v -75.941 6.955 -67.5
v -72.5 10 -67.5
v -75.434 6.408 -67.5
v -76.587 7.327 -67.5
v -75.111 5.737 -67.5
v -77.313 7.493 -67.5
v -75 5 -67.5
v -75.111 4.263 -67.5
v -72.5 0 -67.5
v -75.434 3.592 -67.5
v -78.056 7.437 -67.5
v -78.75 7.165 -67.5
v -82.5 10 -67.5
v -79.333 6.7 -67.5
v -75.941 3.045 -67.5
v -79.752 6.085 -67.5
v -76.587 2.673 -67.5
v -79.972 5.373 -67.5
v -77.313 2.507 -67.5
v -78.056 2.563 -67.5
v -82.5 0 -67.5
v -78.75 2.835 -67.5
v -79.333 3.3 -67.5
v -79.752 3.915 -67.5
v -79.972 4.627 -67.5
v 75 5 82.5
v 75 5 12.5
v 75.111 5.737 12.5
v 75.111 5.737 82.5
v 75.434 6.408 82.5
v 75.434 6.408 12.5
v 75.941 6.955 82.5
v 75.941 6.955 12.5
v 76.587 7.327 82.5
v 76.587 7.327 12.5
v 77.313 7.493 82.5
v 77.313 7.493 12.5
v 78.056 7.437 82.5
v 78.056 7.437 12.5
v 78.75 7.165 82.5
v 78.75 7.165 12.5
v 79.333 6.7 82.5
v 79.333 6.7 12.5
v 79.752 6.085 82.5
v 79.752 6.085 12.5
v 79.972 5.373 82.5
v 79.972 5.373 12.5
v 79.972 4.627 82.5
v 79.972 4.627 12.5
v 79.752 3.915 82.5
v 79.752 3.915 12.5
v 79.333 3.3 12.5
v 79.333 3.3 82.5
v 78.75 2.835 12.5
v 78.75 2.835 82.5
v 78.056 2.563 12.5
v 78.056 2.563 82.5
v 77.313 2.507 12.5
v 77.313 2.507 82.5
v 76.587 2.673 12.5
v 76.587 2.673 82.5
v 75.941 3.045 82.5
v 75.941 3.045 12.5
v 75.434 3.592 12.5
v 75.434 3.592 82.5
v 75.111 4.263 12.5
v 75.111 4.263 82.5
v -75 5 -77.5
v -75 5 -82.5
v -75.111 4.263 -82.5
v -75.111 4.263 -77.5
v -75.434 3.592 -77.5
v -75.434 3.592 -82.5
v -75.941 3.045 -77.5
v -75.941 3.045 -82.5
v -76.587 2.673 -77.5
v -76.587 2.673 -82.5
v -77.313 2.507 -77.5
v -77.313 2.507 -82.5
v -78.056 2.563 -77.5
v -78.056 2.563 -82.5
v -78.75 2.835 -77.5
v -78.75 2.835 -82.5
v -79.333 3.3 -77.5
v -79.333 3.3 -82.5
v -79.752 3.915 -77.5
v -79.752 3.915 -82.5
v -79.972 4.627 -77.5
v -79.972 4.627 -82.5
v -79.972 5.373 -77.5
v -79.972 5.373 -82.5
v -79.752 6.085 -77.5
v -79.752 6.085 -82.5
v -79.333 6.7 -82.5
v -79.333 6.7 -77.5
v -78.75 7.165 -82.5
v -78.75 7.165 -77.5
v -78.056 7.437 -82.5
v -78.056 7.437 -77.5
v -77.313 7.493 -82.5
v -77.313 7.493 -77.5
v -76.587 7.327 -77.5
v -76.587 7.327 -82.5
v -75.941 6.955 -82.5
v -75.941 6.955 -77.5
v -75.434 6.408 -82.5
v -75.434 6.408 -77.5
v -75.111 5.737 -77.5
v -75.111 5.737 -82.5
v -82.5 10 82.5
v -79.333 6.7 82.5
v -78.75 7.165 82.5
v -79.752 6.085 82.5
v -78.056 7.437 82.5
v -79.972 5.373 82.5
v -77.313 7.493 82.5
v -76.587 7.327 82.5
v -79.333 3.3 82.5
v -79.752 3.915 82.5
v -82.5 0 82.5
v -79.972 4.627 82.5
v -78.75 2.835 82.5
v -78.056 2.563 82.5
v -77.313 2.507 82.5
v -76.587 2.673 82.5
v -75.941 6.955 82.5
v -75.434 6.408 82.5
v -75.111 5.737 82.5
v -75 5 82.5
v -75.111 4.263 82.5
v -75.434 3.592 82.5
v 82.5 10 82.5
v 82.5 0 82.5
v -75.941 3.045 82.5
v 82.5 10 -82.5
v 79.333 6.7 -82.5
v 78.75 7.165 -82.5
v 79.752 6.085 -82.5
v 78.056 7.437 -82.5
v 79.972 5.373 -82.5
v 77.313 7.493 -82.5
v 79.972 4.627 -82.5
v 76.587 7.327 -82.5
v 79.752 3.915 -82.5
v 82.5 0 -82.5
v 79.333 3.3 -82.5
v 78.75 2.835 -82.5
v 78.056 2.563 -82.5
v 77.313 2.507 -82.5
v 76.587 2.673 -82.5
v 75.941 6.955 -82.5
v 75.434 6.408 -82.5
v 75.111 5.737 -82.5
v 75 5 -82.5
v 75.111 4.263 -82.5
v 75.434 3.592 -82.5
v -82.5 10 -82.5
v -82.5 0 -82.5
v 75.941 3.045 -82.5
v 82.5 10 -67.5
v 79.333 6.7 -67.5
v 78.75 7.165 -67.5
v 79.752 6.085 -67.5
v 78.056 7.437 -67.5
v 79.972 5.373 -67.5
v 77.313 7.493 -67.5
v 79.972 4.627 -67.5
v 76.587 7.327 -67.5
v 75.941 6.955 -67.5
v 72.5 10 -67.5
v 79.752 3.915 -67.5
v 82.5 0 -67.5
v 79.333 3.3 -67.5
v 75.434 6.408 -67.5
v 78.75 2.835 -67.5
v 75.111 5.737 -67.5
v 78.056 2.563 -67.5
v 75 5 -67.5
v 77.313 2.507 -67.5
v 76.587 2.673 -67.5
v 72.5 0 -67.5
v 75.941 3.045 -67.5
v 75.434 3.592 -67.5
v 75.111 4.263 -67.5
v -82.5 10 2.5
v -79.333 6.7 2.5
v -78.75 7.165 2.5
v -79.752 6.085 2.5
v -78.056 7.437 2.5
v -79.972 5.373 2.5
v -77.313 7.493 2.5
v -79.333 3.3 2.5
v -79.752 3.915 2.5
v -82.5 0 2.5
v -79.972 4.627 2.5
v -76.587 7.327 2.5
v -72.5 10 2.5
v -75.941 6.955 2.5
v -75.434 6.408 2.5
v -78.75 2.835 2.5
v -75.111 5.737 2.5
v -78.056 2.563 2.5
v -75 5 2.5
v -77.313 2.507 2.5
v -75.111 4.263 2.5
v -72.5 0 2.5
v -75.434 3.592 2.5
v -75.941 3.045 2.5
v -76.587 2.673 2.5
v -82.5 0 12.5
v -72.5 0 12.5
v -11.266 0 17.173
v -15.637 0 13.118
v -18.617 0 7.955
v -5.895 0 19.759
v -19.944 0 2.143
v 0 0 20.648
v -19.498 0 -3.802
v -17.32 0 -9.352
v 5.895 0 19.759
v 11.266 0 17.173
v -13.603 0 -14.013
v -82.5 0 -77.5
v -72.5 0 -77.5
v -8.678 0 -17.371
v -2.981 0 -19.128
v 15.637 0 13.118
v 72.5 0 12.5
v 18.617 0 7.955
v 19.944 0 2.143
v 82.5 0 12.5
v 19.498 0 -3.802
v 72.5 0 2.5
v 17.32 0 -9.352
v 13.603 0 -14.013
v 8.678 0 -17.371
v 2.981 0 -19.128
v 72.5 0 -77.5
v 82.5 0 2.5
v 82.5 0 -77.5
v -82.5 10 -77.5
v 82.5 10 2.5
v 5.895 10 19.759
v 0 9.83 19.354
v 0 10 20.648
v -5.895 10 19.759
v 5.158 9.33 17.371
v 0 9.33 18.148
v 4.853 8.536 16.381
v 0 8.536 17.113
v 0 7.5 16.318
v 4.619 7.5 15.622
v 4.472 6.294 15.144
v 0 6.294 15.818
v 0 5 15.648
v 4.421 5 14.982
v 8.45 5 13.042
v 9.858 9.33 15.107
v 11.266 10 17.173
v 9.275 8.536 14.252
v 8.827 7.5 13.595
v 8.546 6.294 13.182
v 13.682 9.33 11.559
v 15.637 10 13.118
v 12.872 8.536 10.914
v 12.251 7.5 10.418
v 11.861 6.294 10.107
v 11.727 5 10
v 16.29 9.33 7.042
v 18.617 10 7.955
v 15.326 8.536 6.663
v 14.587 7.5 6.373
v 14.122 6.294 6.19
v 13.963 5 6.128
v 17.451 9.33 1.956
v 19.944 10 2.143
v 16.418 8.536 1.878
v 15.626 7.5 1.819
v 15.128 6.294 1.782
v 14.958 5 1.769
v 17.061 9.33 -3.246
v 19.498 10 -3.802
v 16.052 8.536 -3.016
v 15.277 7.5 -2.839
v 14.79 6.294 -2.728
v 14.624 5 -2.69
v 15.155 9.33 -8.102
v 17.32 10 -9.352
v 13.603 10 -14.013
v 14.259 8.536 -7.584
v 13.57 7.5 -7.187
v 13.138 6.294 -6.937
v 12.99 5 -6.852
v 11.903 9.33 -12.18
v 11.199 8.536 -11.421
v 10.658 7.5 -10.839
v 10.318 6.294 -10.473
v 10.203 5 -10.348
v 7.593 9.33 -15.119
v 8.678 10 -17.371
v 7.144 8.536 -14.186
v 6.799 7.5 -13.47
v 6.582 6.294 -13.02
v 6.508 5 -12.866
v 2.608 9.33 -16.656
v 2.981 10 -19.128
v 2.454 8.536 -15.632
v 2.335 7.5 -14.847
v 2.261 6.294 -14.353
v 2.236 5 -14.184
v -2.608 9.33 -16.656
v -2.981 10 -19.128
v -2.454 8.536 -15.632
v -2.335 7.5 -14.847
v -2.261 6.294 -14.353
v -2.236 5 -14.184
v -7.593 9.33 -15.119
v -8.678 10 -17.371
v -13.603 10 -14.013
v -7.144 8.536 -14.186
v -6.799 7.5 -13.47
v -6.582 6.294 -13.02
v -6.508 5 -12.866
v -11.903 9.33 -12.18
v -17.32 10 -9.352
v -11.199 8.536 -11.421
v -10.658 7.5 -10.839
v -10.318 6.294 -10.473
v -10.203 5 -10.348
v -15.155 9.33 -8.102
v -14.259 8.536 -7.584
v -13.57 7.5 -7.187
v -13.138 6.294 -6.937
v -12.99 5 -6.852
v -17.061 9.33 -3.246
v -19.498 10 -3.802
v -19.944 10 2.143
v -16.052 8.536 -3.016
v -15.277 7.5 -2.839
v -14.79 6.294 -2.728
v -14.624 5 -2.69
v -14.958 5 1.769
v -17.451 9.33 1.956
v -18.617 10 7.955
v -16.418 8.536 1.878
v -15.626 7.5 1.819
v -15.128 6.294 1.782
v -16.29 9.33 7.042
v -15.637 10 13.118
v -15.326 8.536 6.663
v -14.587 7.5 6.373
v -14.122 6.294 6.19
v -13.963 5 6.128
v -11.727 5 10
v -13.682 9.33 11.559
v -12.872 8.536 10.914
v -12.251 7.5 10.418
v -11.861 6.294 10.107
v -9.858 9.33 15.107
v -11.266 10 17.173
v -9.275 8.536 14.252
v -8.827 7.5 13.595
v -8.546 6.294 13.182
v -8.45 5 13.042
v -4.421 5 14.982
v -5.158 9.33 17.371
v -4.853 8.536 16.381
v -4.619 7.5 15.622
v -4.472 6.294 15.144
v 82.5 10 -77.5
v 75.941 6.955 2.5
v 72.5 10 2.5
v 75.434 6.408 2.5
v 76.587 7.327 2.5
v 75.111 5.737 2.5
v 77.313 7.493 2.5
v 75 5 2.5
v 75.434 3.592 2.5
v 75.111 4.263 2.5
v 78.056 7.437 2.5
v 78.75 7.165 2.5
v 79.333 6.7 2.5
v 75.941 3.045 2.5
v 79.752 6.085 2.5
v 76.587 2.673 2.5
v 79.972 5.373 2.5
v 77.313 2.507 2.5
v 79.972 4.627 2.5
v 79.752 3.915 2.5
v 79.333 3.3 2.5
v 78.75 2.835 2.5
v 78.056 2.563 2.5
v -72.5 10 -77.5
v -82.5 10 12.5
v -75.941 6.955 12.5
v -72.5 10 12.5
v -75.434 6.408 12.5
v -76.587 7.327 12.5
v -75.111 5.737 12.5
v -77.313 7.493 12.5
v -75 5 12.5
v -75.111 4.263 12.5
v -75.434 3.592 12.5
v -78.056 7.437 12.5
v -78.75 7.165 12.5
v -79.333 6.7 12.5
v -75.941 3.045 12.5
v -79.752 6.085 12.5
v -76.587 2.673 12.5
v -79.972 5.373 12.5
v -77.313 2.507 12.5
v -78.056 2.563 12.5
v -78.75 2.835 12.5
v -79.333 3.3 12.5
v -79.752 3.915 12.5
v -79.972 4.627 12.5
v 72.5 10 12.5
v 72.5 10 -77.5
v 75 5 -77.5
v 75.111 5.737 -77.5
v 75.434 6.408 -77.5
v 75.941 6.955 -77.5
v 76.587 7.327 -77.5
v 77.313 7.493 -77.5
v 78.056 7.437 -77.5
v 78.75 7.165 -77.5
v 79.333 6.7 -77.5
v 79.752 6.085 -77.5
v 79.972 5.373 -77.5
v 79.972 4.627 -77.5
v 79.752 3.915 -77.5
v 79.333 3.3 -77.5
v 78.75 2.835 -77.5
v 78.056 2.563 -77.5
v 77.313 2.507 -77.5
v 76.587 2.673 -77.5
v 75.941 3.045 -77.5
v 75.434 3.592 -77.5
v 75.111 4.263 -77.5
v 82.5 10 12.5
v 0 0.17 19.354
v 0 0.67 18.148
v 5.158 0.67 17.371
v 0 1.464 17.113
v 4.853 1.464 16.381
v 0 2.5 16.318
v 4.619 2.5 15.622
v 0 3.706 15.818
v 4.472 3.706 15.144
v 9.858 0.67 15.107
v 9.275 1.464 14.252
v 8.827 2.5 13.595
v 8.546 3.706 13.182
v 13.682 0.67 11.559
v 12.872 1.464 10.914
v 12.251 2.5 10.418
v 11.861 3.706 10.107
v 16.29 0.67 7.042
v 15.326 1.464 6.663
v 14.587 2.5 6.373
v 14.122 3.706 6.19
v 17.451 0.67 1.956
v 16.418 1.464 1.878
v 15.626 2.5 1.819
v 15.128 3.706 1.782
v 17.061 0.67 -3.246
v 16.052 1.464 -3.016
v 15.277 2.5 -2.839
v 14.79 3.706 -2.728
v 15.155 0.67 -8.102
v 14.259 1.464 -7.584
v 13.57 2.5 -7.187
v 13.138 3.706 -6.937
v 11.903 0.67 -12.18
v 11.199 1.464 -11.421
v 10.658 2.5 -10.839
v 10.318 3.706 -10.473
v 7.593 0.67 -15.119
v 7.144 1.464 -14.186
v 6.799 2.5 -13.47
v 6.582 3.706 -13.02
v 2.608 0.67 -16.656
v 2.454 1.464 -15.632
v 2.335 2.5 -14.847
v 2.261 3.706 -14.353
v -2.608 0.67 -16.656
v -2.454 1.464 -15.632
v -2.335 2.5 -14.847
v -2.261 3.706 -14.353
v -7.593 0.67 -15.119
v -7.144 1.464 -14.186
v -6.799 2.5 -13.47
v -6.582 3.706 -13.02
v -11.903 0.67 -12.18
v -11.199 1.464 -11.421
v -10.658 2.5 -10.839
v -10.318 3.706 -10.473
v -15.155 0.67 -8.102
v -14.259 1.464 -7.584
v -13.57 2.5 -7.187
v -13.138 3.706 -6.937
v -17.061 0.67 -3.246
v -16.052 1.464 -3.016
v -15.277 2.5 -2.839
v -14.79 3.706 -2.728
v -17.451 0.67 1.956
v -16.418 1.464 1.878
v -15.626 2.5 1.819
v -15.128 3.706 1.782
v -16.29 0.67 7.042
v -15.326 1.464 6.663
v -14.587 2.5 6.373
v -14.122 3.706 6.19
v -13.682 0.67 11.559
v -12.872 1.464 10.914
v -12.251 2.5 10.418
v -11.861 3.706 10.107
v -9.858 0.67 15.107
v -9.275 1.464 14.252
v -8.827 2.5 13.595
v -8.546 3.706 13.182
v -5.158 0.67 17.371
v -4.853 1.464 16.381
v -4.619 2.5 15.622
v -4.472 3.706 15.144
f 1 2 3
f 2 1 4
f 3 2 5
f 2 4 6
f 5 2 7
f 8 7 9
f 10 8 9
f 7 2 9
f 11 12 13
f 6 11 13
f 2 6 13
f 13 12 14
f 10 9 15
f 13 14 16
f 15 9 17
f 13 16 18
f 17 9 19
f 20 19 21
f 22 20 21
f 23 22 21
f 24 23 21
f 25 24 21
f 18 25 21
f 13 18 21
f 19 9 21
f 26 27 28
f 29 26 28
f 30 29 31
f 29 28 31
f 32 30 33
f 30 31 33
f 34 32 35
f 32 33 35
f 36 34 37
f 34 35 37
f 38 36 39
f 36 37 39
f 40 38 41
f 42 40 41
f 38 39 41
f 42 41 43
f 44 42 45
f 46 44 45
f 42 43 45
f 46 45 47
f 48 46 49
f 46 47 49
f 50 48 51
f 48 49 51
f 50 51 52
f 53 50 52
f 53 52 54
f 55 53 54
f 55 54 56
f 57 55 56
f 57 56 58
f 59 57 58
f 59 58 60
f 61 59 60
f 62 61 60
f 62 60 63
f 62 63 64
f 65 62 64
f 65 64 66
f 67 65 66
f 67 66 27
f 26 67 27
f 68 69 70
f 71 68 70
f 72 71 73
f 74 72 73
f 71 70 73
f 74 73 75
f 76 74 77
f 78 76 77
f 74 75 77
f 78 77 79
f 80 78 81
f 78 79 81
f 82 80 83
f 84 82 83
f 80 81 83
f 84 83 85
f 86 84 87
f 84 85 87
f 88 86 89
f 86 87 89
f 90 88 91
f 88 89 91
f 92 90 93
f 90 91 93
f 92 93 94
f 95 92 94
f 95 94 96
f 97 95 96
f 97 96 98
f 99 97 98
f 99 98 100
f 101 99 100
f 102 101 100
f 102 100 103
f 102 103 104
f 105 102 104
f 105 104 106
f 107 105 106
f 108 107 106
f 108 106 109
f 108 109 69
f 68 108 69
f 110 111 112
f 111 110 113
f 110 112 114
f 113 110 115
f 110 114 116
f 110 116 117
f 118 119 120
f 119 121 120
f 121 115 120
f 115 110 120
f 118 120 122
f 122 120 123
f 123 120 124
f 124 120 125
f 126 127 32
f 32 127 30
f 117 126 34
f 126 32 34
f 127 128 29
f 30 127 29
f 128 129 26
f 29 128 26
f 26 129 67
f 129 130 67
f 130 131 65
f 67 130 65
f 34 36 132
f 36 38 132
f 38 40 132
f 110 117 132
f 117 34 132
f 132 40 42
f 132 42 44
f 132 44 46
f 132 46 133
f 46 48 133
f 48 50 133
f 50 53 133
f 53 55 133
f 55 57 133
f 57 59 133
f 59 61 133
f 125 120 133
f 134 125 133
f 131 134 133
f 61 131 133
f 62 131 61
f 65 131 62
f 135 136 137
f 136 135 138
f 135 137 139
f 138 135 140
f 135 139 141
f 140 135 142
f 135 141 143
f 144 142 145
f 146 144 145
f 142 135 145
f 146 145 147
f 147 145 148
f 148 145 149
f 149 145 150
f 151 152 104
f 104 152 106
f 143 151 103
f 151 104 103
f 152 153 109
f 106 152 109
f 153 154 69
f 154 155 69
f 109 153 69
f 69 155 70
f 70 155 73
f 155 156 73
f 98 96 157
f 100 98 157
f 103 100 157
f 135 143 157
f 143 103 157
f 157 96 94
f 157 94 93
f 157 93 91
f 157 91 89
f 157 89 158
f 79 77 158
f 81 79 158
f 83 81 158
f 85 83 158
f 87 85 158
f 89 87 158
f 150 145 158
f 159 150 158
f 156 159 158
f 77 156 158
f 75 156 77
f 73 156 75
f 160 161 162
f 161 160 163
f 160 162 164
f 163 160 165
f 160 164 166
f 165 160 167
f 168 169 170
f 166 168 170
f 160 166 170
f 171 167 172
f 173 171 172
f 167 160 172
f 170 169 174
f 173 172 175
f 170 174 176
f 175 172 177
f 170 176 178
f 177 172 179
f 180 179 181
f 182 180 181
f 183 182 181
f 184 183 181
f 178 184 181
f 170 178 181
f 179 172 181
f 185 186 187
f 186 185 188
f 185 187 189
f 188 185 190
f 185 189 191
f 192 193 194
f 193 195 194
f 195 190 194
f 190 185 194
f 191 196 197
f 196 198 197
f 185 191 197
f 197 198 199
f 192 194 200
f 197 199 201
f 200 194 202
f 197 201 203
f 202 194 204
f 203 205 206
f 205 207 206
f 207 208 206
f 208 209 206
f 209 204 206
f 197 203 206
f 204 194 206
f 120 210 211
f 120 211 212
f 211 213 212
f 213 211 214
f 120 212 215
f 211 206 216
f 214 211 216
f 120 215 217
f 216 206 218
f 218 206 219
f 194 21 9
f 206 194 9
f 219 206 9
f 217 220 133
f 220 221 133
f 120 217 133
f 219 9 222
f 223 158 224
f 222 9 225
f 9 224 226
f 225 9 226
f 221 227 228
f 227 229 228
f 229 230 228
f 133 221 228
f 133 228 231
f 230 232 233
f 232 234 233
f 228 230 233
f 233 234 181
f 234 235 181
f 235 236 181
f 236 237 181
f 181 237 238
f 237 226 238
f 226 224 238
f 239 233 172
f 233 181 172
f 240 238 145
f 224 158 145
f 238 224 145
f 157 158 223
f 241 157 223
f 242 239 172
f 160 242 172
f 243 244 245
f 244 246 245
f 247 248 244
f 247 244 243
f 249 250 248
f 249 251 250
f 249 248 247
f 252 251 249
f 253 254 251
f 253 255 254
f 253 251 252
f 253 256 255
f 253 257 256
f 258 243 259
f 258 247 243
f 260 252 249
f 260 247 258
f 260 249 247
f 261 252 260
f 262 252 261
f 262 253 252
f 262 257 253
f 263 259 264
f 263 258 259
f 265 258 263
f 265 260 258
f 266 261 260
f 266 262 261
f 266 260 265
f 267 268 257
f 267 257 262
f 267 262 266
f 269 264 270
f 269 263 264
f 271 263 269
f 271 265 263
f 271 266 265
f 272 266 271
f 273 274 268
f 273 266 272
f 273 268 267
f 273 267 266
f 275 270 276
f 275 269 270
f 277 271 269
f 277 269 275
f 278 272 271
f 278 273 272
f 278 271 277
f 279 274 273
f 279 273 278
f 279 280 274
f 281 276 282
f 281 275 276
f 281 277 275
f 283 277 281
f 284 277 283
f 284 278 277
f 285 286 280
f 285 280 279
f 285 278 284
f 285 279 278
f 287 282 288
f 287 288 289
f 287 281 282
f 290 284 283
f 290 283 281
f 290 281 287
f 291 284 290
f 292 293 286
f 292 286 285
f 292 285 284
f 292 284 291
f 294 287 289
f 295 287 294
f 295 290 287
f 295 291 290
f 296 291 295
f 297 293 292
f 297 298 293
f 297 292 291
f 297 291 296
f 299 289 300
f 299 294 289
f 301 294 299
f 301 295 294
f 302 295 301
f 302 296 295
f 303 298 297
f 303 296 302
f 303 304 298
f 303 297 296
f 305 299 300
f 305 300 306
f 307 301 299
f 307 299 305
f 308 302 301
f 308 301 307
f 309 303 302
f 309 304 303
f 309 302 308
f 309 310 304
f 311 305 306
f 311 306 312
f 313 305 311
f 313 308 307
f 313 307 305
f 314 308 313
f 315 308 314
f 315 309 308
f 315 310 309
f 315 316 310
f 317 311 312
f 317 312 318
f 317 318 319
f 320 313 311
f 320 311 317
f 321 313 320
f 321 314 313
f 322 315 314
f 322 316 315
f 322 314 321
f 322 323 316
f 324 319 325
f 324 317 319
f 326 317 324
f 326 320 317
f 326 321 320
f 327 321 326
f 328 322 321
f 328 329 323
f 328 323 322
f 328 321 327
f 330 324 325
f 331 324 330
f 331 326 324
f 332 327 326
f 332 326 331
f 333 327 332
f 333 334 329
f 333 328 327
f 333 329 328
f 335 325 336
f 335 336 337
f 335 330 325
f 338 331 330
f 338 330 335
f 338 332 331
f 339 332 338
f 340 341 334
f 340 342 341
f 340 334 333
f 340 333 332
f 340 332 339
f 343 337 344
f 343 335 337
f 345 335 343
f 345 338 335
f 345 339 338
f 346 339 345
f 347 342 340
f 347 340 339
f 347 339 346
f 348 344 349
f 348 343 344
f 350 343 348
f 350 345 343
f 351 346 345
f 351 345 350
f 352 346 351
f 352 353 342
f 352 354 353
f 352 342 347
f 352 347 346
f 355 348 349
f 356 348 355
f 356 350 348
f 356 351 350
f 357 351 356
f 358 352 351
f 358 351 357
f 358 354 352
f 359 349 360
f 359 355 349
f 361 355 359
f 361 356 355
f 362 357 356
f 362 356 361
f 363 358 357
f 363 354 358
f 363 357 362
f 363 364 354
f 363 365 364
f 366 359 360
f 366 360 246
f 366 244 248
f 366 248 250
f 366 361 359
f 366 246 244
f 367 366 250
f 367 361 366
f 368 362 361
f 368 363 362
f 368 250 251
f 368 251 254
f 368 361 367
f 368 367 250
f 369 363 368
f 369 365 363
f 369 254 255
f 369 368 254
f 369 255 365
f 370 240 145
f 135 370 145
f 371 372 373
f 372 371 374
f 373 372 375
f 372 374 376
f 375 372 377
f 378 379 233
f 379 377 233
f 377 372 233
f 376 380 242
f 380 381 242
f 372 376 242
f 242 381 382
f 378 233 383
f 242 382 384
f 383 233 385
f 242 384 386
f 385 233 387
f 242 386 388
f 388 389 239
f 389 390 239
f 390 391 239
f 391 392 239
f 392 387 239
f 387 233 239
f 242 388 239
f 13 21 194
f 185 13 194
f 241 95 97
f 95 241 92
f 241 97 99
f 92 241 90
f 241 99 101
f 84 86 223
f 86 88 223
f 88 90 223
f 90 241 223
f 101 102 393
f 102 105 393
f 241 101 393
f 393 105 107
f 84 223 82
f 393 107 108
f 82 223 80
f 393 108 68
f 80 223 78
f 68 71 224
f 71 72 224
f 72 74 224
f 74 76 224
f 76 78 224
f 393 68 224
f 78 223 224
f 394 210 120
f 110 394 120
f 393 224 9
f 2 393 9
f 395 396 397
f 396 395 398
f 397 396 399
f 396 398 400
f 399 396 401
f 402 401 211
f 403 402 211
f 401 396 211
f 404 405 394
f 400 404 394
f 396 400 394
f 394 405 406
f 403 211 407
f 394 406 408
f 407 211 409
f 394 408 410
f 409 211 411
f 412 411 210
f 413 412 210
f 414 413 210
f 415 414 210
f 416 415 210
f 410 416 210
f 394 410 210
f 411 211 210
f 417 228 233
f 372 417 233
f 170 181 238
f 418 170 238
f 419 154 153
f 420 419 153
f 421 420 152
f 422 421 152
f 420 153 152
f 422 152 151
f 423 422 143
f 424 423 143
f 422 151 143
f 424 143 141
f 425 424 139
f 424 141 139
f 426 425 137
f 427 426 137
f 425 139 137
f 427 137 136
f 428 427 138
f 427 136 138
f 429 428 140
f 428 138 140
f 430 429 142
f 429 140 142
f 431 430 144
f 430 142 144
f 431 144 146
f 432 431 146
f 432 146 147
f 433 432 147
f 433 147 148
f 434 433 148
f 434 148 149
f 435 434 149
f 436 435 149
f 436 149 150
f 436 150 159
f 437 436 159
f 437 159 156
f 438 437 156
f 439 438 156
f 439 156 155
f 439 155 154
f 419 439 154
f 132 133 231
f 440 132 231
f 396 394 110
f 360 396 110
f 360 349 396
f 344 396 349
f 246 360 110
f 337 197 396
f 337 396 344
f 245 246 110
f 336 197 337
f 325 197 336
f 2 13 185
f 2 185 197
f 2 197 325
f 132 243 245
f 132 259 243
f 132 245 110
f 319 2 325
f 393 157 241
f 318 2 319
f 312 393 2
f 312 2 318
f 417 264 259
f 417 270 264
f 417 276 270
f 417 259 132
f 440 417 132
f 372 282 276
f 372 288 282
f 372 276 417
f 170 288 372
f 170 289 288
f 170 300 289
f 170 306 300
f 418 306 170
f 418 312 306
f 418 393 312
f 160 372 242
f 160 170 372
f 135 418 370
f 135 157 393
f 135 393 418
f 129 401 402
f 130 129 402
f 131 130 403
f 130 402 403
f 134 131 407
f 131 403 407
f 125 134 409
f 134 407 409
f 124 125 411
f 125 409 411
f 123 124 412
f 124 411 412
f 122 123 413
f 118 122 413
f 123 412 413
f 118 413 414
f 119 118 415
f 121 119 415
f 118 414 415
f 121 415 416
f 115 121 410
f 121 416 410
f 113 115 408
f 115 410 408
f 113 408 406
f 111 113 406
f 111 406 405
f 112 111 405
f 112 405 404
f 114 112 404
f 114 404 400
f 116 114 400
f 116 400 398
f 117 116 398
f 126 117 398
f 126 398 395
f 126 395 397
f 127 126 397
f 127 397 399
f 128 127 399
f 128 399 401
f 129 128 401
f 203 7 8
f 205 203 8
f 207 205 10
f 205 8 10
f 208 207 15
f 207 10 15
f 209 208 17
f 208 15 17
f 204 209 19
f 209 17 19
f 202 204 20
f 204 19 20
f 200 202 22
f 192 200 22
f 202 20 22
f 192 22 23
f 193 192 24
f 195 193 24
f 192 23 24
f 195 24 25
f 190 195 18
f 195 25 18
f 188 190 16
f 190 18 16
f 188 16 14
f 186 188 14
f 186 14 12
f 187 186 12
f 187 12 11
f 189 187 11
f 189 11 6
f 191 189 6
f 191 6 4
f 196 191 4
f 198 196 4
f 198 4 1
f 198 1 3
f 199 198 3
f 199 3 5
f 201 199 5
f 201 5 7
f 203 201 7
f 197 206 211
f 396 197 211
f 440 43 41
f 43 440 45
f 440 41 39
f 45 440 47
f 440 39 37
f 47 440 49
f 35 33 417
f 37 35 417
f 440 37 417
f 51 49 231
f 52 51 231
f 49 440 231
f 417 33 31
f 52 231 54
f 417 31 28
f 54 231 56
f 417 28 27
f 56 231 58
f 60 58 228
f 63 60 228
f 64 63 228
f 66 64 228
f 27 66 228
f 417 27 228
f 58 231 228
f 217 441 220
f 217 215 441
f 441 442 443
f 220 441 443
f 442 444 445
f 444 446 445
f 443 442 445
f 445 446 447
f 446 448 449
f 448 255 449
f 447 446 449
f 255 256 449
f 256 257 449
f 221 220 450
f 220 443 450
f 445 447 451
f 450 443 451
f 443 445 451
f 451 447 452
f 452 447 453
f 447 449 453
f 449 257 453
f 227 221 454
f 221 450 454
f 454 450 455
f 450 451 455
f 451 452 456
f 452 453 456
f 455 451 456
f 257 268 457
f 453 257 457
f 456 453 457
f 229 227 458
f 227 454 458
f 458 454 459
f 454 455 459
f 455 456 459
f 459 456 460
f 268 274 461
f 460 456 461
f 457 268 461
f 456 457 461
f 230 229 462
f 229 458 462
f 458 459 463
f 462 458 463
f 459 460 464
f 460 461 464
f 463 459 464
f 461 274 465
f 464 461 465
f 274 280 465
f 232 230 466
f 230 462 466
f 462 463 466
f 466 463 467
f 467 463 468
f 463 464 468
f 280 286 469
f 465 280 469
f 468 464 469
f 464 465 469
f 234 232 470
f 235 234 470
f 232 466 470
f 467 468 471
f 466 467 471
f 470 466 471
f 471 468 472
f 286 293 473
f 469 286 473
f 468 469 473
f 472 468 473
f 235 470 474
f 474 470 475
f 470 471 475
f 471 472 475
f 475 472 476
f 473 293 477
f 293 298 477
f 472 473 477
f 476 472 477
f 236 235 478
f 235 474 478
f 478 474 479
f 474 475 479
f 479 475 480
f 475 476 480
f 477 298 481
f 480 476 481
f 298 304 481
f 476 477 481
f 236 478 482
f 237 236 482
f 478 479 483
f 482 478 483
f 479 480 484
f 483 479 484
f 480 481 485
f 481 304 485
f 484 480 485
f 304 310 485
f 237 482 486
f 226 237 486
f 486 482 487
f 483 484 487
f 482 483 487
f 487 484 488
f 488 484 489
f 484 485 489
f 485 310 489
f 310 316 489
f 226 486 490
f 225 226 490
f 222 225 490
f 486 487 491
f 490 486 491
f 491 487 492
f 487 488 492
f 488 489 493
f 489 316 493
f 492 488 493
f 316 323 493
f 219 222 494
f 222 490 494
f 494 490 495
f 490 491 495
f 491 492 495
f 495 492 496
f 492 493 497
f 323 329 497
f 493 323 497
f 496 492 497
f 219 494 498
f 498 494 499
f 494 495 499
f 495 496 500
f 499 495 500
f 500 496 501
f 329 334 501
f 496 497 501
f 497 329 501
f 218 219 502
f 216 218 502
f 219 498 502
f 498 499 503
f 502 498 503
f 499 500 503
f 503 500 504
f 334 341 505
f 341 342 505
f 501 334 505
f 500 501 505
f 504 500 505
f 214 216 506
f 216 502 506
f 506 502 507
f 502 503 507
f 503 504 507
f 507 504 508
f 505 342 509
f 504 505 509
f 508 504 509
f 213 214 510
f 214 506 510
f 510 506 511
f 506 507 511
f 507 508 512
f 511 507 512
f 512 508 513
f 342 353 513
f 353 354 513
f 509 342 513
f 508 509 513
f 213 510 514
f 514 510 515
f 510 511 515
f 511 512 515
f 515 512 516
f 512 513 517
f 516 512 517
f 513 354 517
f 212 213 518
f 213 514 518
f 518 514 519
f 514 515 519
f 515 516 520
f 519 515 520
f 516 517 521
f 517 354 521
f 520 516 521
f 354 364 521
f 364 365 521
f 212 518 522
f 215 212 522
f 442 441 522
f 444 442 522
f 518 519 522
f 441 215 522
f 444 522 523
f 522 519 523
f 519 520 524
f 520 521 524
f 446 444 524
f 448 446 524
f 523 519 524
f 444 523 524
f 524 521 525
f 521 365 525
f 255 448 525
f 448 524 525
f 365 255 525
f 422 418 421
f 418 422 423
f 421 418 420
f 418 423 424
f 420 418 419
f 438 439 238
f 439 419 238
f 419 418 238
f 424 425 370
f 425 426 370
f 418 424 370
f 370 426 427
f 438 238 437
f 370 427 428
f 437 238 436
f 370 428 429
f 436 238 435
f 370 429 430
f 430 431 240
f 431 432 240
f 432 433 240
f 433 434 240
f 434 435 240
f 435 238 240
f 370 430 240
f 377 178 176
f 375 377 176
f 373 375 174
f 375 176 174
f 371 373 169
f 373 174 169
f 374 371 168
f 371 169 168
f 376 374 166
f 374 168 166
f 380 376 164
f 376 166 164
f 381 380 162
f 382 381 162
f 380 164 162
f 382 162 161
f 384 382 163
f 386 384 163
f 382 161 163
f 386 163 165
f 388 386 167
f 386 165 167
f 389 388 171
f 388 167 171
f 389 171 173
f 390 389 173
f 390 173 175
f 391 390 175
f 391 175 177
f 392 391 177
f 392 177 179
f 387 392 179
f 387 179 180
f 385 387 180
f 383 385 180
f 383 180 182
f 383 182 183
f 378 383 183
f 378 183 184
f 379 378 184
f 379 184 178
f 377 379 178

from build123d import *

# Parameters (mm, degrees)
ESQUISSE1_R    = 15
BASE_DEPTH     = 10
ESQUISSE2_R    = 2.5
VIDE_VIS_DEPTH = 185.746447868
CONGE_CABLE_R  = 5


with BuildPart() as part:
    # Esquisse1 → BASE (new body)
    with BuildSketch(Plane(origin=(0, 0, 0), x_dir=(1, 0, 0), z_dir=(0, 1, 0))):
        Polygon((-82.5, 77.5), (-72.5, 77.5), (-72.5, 67.5), (-82.5, 67.5), (-82.5, -2.5), (-72.5, -2.5), (-72.5, -12.5), (-82.5, -12.5), (-82.5, -82.5), (82.5, -82.5), (82.5, -12.5), (72.5, -12.5), (72.5, -2.5), (82.5, -2.5), (82.5, 67.5), (72.5, 67.5), (72.5, 77.5), (82.5, 77.5), (82.5, 82.5), (-82.5, 82.5), align=None)
        with Locations(Location((0, -0.648107225, 0), (0, 0, 270))):
            Circle(ESQUISSE1_R, mode=Mode.SUBTRACT)
    extrude(amount=BASE_DEPTH)

    # Esquisse2 → VIDE VIS (cut, through all)
    with BuildSketch(Plane(origin=(0, 0, -82.5), x_dir=(-1, 0, 0), z_dir=(0, 0, -1))):
        with Locations((-77.5, 5)):
            Circle(ESQUISSE2_R)
        with Locations(Location((77.5, 5, 0), (0, 0, 180))):
            Circle(ESQUISSE2_R)
    extrude(amount=-VIDE_VIS_DEPTH, mode=Mode.SUBTRACT)

    # CONGE CABLE
    conge_cable_edges = [part.edges().sort_by_distance(p)[0] for p in [
        (0, 0, -14.351892775),
        (0, 10, -14.351892775),
    ]]
    fillet(conge_cable_edges, radius=CONGE_CABLE_R - 0.0001)  # a hair under: the kernel refuses the full size


solid = part.part
